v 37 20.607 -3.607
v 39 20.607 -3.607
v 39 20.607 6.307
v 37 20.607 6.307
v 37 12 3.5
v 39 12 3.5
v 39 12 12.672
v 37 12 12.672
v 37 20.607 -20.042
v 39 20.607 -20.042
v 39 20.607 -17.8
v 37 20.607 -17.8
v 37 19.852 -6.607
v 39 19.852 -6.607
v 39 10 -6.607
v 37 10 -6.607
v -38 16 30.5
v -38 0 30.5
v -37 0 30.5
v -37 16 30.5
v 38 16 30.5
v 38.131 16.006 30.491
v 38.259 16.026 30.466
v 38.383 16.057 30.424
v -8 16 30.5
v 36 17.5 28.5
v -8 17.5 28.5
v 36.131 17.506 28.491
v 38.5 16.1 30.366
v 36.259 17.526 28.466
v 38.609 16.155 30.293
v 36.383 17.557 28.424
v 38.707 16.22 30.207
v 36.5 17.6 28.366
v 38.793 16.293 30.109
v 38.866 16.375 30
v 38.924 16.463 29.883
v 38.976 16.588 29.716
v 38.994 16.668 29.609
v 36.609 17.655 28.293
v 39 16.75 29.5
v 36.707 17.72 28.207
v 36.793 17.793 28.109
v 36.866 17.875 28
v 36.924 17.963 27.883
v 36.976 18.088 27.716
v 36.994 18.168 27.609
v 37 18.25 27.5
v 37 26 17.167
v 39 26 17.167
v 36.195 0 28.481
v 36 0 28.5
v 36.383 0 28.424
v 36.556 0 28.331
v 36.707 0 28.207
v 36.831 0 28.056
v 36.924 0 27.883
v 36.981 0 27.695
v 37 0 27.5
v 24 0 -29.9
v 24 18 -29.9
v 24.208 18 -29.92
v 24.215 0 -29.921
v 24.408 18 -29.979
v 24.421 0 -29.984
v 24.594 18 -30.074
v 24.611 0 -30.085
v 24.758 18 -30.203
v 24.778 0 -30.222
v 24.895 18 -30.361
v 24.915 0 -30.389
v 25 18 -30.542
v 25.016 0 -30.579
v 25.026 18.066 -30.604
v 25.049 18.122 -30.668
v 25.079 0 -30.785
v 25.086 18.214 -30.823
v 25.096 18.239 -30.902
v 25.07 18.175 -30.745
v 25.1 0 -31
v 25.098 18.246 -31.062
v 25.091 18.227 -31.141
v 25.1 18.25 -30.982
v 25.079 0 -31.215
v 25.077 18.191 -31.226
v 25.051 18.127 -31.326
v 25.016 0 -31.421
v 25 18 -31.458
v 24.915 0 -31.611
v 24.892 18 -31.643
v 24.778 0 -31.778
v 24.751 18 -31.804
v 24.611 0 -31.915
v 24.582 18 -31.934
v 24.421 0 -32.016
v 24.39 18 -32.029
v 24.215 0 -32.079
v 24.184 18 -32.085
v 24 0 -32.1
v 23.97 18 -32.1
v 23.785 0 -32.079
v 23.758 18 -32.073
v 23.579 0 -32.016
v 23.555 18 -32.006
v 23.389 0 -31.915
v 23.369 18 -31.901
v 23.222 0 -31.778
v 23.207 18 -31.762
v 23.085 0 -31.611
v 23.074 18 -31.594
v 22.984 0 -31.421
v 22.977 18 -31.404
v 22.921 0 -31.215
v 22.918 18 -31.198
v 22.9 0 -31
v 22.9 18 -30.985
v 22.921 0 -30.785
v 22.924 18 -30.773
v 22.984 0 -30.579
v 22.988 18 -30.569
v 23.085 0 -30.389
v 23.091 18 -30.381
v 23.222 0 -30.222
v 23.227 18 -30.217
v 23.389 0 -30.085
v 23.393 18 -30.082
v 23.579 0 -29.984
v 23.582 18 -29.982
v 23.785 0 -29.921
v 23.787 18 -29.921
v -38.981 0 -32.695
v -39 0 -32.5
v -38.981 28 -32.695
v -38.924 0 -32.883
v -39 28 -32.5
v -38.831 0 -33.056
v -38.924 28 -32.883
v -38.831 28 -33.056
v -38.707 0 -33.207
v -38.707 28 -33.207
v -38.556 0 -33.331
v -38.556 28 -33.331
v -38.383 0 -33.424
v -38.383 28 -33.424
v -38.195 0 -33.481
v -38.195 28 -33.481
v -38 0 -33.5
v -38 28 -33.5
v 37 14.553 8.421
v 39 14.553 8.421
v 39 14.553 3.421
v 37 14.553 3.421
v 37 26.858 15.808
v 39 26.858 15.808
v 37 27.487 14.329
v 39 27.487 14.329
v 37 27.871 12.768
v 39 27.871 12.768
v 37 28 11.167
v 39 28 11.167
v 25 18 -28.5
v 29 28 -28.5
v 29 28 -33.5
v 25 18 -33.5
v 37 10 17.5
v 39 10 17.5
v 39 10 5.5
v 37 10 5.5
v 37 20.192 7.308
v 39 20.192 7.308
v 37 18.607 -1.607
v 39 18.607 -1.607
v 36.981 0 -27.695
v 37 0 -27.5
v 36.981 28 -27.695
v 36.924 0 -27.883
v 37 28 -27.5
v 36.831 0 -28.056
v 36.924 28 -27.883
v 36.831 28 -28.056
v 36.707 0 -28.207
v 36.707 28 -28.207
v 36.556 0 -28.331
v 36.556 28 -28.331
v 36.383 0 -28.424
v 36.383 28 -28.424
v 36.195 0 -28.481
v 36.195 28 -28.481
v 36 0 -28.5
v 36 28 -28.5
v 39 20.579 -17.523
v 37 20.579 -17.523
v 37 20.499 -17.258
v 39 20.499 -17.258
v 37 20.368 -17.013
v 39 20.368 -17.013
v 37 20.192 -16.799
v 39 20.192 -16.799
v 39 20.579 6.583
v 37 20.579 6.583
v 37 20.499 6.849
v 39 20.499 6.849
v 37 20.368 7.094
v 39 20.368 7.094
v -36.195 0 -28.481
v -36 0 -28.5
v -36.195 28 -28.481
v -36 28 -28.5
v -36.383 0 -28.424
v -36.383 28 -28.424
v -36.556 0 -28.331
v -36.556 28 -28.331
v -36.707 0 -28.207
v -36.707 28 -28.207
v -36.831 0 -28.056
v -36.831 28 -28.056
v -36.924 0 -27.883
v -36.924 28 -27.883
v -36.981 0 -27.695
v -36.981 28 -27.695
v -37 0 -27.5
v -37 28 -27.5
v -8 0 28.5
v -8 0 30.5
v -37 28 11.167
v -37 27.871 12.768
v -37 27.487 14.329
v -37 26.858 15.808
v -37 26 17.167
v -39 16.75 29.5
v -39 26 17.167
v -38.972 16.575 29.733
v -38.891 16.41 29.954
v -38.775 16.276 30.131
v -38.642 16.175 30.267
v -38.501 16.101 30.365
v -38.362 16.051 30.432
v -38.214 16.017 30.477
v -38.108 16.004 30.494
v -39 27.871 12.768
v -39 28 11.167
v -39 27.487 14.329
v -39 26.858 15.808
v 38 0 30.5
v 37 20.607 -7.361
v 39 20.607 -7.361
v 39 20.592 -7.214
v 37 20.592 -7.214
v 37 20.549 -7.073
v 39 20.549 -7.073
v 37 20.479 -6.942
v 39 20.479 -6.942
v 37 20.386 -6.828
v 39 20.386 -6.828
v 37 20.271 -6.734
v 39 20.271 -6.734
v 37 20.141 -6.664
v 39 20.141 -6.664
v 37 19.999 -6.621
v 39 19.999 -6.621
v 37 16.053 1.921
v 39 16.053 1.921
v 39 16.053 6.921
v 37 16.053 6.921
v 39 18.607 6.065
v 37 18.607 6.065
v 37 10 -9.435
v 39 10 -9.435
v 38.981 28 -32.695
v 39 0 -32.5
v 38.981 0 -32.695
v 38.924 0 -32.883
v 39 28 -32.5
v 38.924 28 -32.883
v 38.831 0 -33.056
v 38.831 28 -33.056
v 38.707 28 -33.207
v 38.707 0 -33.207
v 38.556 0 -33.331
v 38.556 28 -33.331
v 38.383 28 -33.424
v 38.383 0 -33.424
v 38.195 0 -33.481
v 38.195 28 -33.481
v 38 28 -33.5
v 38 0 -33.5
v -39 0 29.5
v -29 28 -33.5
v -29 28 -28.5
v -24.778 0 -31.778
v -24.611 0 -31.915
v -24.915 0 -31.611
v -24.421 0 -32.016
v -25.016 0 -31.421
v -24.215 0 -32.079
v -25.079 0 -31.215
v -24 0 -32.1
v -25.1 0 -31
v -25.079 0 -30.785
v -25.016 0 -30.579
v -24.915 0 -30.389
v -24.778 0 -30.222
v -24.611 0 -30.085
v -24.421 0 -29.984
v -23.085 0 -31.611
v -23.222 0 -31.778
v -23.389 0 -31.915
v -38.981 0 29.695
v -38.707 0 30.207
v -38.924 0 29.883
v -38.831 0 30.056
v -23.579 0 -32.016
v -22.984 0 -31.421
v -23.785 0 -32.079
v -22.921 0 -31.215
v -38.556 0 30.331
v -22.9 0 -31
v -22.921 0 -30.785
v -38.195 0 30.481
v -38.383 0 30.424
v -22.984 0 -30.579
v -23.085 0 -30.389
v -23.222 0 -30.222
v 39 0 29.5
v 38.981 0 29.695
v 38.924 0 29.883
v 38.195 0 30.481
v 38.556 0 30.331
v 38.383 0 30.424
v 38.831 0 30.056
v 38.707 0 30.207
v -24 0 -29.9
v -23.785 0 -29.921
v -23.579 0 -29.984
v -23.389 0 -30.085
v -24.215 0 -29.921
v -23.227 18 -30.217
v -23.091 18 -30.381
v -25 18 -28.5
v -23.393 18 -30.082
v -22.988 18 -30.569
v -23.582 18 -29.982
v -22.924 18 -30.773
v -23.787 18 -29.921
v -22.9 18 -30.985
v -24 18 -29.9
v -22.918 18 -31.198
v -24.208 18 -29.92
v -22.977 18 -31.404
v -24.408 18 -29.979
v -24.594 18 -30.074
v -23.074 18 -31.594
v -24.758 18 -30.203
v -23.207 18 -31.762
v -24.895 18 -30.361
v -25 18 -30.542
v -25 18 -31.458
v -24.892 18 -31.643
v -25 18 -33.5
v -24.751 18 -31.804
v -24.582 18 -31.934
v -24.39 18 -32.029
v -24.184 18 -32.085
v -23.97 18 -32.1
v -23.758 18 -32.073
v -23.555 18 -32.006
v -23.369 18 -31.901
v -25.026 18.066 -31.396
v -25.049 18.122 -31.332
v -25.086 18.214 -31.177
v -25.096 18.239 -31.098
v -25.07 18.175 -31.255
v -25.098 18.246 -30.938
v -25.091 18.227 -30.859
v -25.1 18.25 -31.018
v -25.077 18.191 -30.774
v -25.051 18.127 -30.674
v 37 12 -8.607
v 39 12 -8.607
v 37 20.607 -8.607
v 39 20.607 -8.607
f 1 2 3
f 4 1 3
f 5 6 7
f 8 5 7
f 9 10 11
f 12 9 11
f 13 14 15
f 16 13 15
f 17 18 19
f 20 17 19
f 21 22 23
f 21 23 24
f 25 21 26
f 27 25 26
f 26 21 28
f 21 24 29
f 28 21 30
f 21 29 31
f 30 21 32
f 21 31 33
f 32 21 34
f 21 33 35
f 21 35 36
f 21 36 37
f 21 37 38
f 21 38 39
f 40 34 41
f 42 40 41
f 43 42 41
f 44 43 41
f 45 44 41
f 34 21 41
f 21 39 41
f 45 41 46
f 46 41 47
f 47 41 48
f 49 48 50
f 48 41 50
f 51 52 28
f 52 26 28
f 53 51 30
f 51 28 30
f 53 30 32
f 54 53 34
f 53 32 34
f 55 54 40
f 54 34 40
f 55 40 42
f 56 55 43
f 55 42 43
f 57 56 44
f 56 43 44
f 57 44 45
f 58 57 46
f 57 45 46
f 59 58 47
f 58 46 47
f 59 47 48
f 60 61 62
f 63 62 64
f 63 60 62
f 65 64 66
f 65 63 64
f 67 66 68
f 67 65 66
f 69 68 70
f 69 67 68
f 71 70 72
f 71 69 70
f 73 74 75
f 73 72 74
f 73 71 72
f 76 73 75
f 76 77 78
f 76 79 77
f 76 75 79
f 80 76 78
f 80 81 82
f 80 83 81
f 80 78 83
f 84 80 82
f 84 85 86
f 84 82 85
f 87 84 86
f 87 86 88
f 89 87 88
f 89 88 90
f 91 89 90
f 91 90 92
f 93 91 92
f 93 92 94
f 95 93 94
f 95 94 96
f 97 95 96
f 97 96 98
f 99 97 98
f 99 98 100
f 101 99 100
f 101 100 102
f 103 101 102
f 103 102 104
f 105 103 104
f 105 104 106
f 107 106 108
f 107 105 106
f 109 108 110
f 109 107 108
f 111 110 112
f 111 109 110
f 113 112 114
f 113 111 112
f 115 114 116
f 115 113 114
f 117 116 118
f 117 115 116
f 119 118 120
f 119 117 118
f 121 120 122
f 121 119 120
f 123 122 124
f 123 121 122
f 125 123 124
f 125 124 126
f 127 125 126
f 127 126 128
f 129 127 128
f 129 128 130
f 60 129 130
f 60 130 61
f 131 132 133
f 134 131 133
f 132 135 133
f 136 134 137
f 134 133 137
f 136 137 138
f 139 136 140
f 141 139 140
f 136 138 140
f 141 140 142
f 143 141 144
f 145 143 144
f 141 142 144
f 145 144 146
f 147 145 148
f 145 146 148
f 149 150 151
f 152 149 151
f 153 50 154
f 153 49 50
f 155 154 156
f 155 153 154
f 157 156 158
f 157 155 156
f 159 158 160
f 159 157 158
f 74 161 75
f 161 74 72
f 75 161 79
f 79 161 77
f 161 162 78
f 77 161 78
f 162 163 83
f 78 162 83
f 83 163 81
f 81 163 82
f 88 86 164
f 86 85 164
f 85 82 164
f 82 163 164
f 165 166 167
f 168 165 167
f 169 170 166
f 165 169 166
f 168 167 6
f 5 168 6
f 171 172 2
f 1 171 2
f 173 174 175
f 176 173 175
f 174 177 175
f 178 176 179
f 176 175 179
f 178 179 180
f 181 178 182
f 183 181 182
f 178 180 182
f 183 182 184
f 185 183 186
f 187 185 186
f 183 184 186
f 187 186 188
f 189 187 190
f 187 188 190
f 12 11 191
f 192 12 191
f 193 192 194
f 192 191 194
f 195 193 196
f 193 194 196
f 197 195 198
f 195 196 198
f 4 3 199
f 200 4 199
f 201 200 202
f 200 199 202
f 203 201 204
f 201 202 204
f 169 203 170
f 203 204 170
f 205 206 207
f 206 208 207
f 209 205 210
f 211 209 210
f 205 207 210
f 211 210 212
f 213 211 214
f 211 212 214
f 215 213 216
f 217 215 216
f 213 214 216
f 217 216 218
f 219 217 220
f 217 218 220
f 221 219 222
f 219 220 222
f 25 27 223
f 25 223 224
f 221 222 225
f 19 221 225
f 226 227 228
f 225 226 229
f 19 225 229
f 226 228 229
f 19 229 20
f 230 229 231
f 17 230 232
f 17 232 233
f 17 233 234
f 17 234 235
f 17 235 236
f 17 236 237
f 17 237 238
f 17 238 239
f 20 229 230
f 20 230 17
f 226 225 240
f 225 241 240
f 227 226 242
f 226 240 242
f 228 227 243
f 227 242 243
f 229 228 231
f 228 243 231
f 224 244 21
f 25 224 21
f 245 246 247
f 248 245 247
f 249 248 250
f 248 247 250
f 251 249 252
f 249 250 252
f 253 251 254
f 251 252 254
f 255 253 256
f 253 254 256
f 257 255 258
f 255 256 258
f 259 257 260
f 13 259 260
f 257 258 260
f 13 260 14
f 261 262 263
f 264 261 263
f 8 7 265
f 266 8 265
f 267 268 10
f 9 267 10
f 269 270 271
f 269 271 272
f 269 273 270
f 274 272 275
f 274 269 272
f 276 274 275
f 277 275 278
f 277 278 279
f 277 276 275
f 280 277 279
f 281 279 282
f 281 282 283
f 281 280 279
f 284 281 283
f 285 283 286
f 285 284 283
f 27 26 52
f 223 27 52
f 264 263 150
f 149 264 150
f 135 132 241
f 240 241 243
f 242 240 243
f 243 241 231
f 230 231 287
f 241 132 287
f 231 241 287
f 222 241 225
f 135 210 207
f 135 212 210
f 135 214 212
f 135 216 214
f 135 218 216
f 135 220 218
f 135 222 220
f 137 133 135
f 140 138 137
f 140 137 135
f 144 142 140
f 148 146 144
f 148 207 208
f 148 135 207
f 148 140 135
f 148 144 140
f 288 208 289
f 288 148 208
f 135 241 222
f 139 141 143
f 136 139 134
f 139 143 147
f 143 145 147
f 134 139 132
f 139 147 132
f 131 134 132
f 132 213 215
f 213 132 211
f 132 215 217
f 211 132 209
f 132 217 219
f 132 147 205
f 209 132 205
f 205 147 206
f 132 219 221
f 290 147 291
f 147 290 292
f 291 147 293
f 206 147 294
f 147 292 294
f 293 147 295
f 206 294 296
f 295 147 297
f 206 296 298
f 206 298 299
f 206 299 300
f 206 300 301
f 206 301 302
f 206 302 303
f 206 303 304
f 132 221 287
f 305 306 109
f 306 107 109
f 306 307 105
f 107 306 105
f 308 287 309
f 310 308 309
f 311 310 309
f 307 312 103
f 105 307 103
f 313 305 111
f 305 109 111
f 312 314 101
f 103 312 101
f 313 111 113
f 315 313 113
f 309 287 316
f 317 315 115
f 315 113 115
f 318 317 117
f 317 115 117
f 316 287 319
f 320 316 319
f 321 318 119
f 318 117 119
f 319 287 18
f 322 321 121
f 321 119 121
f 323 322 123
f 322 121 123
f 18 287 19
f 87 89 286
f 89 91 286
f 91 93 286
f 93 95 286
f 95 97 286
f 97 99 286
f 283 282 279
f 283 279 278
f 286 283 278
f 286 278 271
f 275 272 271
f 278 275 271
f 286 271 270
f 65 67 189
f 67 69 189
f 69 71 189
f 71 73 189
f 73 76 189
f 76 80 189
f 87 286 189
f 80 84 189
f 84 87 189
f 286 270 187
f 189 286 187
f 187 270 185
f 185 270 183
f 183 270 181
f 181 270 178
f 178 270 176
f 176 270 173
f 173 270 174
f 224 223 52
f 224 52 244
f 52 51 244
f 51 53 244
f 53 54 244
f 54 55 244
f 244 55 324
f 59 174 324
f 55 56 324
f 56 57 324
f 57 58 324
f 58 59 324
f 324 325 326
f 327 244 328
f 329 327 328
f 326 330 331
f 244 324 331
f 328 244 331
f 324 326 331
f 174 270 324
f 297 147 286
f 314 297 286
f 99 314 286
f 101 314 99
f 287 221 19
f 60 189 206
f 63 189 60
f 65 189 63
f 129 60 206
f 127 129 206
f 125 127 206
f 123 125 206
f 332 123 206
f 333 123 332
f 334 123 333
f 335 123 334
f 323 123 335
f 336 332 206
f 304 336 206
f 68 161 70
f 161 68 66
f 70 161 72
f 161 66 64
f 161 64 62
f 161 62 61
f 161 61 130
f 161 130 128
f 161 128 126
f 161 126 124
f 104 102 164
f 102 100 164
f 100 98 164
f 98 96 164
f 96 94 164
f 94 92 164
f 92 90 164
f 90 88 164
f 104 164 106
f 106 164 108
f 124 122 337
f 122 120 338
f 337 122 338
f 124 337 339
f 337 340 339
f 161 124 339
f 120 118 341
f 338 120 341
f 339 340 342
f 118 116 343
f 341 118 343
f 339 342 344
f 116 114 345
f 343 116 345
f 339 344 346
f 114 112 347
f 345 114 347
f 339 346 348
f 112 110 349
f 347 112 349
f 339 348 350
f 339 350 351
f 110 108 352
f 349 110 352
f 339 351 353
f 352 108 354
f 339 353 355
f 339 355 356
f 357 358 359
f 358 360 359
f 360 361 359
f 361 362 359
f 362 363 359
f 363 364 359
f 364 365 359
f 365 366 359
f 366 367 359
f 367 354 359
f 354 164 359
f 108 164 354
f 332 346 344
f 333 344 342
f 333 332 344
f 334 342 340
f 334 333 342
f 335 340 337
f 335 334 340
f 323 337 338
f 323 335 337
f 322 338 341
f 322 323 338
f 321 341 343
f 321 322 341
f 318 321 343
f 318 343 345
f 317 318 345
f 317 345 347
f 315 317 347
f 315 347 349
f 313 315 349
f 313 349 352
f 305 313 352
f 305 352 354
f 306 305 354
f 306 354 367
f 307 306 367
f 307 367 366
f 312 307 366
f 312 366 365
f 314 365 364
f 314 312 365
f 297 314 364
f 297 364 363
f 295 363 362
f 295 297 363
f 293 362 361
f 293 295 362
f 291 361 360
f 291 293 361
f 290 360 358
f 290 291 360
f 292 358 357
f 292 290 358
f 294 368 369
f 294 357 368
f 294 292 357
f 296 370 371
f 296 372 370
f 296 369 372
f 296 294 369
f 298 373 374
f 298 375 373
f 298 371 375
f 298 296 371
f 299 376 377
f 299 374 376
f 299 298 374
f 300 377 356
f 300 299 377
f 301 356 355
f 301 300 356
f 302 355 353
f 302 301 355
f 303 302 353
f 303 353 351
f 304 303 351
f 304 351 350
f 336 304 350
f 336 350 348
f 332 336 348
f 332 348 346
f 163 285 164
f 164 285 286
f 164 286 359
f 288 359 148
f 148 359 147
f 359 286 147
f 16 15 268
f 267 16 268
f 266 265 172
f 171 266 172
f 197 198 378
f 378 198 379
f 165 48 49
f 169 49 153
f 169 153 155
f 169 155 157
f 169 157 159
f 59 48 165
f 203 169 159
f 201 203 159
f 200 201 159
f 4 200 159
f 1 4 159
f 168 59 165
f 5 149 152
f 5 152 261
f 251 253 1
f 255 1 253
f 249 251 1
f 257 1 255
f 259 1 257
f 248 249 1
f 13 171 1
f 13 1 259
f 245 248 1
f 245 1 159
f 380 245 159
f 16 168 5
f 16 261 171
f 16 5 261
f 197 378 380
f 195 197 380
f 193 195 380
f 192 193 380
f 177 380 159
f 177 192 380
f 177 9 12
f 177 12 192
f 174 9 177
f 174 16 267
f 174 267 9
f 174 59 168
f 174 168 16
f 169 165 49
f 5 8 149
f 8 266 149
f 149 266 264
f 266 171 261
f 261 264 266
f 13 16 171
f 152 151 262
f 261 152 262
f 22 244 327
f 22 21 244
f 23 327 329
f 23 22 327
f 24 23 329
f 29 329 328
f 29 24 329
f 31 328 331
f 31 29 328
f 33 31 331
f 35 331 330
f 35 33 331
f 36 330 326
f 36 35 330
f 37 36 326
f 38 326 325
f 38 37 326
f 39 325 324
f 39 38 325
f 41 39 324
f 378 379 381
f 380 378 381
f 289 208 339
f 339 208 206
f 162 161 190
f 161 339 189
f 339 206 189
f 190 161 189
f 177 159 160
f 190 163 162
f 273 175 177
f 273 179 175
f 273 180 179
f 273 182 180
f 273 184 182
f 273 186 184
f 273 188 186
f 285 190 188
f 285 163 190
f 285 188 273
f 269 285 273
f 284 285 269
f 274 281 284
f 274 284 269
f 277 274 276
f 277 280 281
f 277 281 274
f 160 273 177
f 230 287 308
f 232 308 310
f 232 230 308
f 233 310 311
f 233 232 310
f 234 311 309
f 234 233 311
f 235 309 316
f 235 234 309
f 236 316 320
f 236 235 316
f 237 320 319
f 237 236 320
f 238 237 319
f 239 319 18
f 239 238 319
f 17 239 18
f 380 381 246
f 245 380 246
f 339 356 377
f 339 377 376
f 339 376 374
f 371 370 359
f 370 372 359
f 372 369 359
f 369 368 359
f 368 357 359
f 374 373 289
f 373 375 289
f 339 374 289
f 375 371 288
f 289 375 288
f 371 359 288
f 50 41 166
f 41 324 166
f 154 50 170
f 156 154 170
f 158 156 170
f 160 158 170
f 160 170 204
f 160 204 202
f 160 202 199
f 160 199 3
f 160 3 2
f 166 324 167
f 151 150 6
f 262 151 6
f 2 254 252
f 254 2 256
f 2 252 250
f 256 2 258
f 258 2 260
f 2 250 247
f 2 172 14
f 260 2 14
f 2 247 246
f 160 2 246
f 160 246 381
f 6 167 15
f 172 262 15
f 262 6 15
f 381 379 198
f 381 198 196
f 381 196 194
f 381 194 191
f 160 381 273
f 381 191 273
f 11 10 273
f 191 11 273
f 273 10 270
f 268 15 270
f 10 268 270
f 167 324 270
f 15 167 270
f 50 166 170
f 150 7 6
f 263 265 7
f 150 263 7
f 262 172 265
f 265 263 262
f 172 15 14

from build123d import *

# Parameters (mm, degrees)
SKETCH_1_R          = 1.1
SKETCH_1_W          = 74
SKETCH_1_H          = 57
EXTRUDE_1_DEPTH     = 28
SKETCH_2_W          = 40
SKETCH_2_H          = 14
CUT_EXTRUDE_1_DEPTH = 28
CUT_EXTRUDE_2_DEPTH = 90.388198326
CUT_EXTRUDE_5_DEPTH = 59.542719445
EXTRUDE_2_DEPTH     = 28
FILLET_1_R          = 1
FILLET_2_R          = 1
FILLET_3_R          = 10
CUT_EXTRUDE_6_REACH = 82.006
CUT_EXTRUDE_7_REACH = 91.388


with BuildPart() as part:
    # 草图1 → 凸台-拉伸1 (new body)
    with BuildSketch(Plane(origin=(0, 0, 0), x_dir=(1, 0, 0), z_dir=(0, 1, 0))):
        Polygon((-39, -30.5), (39, -30.5), (39, 30.5), (39, 33.5), (-39, 33.5), (-39, 30.5), align=None)
        with Locations(Location((24, 31, 0), (0, 0, 270))):
            Circle(SKETCH_1_R, mode=Mode.SUBTRACT)
        with Locations(Location((-24, 31, 0), (0, 0, 270))):
            Circle(SKETCH_1_R, mode=Mode.SUBTRACT)
        Rectangle(SKETCH_1_W, SKETCH_1_H, mode=Mode.SUBTRACT)
    extrude(amount=EXTRUDE_1_DEPTH)

    # 草图2 → 切除-拉伸1 (cut)
    with BuildSketch(Plane(origin=(0, 28, 0), x_dir=(1, 0, 0), z_dir=(0, 1, 0))):
        with Locations((0, -30.5)):
            Rectangle(SKETCH_2_W, SKETCH_2_H)
    extrude(amount=-CUT_EXTRUDE_1_DEPTH, mode=Mode.SUBTRACT)

    # 草图3 → 切除-拉伸2 (cut, through all)
    with BuildSketch(Plane(origin=(39, 0, 0), x_dir=(0, 0, -1), z_dir=(1, 0, 0))):
        Polygon((-30.5, 28), (-14.5, 28), (-30.5, 16), align=None)
    extrude(amount=-CUT_EXTRUDE_2_DEPTH, mode=Mode.SUBTRACT)

    # 草图4 → 切除-拉伸5 (cut, through all)
    with BuildSketch(Plane(origin=(0, 28, 0), x_dir=(1, 0, 0), z_dir=(0, 1, 0))):
        Polygon((-37, -14.5), (-37, -36.587874711), (-17, -36.587874711), (-17, -15.951475091), align=None)
    extrude(amount=-CUT_EXTRUDE_5_DEPTH, mode=Mode.SUBTRACT)

    # 草图5 → 凸台-拉伸2 (add)
    with BuildSketch(Plane.ZY.offset(-20)):
        Polygon((30.5, 0), (30.5, 16), (28.5, 17.5), (28.5, 0), align=None)
    extrude(amount=EXTRUDE_2_DEPTH)

    # 圆角1
    fillet_1_edges = [part.edges().sort_by_distance(p)[0] for p in [
        (-39, 14, -33.5),
        (39, 14, -33.5),
        (39, 8, 30.5),
        (-39, 8, 30.5),
    ]]
    fillet(fillet_1_edges, radius=FILLET_1_R)

    # 圆角2
    fillet_2_edges = [part.edges().sort_by_distance(p)[0] for p in [
        (37, 14, -28.5),
        (-37, 14, -28.5),
        (37, 8.75, 28.5),
    ]]
    fillet(fillet_2_edges, radius=FILLET_2_R)

    # 圆角3
    fillet_3_edges = [part.edges().sort_by_distance(p)[0] for p in [
        (-38, 28, 14.5),
        (38, 28, 14.5),
    ]]
    fillet(fillet_3_edges, radius=FILLET_3_R)

    # 草图8 → 切除-拉伸6 (cut, up to next)
    with BuildSketch(Plane(origin=(0, 0, -33.5), x_dir=(-1, 0, 0), z_dir=(0, 0, -1)), mode=Mode.PRIVATE) as cut_extrude_6_sk1:
        Polygon((29, 28), (-29, 28), (-25, 18), (25, 18), align=None)
    cut_extrude_6_tool1 = extrude(cut_extrude_6_sk1.sketch, amount=-CUT_EXTRUDE_6_REACH, mode=Mode.PRIVATE) & part.part
    add(cut_extrude_6_tool1.solids().sort_by_distance((0, 23.123457, -33.5))[0], mode=Mode.SUBTRACT)

    # 草图9 → 切除-拉伸7 (cut, up to next)
    with BuildSketch(Plane(origin=(39, 0, 0), x_dir=(0, 0, -1), z_dir=(1, 0, 0)), mode=Mode.PRIVATE) as cut_extrude_7_sk1:
        with BuildLine():
            Line((-7.308033396, 20.191966604), (-17.5, 10))
            Line((-17.5, 10), (-5.5, 10))
            Line((-5.5, 10), (-3.5, 12))
            Line((-3.5, 12), (-12.671572875, 12))
            Line((-12.671572875, 12), (-6.064971157, 18.606601718))
            Line((-6.064971157, 18.606601718), (1.606601718, 18.606601718))
            Line((1.606601718, 18.606601718), (3.606601718, 20.606601718))
            Line((3.606601718, 20.606601718), (-6.307015681, 20.606601718))
            ThreePointArc((-6.307015681, 20.606601718), (-6.848762564, 20.498841563), (-7.308033396, 20.191966604))
        make_face()
    cut_extrude_7_tool1 = extrude(cut_extrude_7_sk1.sketch, amount=-CUT_EXTRUDE_7_REACH, mode=Mode.PRIVATE) & part.part
    # 草图9 → 切除-拉伸7 (cut, up to next)
    with BuildSketch(Plane(origin=(39, 0, 0), x_dir=(0, 0, -1), z_dir=(1, 0, 0)), mode=Mode.PRIVATE) as cut_extrude_7_sk2:
        with BuildLine():
            Line((6.606601718, 19.851812513), (6.606601718, 10))
            Line((6.606601718, 10), (9.435028843, 10))
            Line((9.435028843, 10), (20.04163056, 20.606601718))
            Line((20.04163056, 20.606601718), (17.799586037, 20.606601718))
            ThreePointArc((17.799586037, 20.606601718), (17.257839153, 20.498841563), (16.798568322, 20.191966604))
            Line((16.798568322, 20.191966604), (8.606601718, 12))
            Line((8.606601718, 12), (8.606601718, 20.606601718))
            Line((8.606601718, 20.606601718), (7.361390923, 20.606601718))
            ThreePointArc((7.361390923, 20.606601718), (6.827674357, 20.385529078), (6.606601718, 19.851812513))
        make_face()
    cut_extrude_7_tool2 = extrude(cut_extrude_7_sk2.sketch, amount=-CUT_EXTRUDE_7_REACH, mode=Mode.PRIVATE) & part.part
    # 草图9 → 切除-拉伸7 (cut, up to next)
    with BuildSketch(Plane(origin=(39, 0, 0), x_dir=(0, 0, -1), z_dir=(1, 0, 0)), mode=Mode.PRIVATE) as cut_extrude_7_sk3:
        Polygon((-6.921215742, 16.053300859), (-8.421215742, 14.553300859), (-3.421215742, 14.553300859), (-1.921215742, 16.053300859), align=None)
    cut_extrude_7_tool3 = extrude(cut_extrude_7_sk3.sketch, amount=-CUT_EXTRUDE_7_REACH, mode=Mode.PRIVATE) & part.part
    add(cut_extrude_7_tool1.solids().sort_by_distance((39, 14.928952, 12.236985))[0], mode=Mode.SUBTRACT)
    add(cut_extrude_7_tool2.solids().sort_by_distance((39, 14.925906, -6.777774))[0], mode=Mode.SUBTRACT)
    add(cut_extrude_7_tool3.solids().sort_by_distance((39, 15.303301, 5.171216))[0], mode=Mode.SUBTRACT)


solid = part.part
